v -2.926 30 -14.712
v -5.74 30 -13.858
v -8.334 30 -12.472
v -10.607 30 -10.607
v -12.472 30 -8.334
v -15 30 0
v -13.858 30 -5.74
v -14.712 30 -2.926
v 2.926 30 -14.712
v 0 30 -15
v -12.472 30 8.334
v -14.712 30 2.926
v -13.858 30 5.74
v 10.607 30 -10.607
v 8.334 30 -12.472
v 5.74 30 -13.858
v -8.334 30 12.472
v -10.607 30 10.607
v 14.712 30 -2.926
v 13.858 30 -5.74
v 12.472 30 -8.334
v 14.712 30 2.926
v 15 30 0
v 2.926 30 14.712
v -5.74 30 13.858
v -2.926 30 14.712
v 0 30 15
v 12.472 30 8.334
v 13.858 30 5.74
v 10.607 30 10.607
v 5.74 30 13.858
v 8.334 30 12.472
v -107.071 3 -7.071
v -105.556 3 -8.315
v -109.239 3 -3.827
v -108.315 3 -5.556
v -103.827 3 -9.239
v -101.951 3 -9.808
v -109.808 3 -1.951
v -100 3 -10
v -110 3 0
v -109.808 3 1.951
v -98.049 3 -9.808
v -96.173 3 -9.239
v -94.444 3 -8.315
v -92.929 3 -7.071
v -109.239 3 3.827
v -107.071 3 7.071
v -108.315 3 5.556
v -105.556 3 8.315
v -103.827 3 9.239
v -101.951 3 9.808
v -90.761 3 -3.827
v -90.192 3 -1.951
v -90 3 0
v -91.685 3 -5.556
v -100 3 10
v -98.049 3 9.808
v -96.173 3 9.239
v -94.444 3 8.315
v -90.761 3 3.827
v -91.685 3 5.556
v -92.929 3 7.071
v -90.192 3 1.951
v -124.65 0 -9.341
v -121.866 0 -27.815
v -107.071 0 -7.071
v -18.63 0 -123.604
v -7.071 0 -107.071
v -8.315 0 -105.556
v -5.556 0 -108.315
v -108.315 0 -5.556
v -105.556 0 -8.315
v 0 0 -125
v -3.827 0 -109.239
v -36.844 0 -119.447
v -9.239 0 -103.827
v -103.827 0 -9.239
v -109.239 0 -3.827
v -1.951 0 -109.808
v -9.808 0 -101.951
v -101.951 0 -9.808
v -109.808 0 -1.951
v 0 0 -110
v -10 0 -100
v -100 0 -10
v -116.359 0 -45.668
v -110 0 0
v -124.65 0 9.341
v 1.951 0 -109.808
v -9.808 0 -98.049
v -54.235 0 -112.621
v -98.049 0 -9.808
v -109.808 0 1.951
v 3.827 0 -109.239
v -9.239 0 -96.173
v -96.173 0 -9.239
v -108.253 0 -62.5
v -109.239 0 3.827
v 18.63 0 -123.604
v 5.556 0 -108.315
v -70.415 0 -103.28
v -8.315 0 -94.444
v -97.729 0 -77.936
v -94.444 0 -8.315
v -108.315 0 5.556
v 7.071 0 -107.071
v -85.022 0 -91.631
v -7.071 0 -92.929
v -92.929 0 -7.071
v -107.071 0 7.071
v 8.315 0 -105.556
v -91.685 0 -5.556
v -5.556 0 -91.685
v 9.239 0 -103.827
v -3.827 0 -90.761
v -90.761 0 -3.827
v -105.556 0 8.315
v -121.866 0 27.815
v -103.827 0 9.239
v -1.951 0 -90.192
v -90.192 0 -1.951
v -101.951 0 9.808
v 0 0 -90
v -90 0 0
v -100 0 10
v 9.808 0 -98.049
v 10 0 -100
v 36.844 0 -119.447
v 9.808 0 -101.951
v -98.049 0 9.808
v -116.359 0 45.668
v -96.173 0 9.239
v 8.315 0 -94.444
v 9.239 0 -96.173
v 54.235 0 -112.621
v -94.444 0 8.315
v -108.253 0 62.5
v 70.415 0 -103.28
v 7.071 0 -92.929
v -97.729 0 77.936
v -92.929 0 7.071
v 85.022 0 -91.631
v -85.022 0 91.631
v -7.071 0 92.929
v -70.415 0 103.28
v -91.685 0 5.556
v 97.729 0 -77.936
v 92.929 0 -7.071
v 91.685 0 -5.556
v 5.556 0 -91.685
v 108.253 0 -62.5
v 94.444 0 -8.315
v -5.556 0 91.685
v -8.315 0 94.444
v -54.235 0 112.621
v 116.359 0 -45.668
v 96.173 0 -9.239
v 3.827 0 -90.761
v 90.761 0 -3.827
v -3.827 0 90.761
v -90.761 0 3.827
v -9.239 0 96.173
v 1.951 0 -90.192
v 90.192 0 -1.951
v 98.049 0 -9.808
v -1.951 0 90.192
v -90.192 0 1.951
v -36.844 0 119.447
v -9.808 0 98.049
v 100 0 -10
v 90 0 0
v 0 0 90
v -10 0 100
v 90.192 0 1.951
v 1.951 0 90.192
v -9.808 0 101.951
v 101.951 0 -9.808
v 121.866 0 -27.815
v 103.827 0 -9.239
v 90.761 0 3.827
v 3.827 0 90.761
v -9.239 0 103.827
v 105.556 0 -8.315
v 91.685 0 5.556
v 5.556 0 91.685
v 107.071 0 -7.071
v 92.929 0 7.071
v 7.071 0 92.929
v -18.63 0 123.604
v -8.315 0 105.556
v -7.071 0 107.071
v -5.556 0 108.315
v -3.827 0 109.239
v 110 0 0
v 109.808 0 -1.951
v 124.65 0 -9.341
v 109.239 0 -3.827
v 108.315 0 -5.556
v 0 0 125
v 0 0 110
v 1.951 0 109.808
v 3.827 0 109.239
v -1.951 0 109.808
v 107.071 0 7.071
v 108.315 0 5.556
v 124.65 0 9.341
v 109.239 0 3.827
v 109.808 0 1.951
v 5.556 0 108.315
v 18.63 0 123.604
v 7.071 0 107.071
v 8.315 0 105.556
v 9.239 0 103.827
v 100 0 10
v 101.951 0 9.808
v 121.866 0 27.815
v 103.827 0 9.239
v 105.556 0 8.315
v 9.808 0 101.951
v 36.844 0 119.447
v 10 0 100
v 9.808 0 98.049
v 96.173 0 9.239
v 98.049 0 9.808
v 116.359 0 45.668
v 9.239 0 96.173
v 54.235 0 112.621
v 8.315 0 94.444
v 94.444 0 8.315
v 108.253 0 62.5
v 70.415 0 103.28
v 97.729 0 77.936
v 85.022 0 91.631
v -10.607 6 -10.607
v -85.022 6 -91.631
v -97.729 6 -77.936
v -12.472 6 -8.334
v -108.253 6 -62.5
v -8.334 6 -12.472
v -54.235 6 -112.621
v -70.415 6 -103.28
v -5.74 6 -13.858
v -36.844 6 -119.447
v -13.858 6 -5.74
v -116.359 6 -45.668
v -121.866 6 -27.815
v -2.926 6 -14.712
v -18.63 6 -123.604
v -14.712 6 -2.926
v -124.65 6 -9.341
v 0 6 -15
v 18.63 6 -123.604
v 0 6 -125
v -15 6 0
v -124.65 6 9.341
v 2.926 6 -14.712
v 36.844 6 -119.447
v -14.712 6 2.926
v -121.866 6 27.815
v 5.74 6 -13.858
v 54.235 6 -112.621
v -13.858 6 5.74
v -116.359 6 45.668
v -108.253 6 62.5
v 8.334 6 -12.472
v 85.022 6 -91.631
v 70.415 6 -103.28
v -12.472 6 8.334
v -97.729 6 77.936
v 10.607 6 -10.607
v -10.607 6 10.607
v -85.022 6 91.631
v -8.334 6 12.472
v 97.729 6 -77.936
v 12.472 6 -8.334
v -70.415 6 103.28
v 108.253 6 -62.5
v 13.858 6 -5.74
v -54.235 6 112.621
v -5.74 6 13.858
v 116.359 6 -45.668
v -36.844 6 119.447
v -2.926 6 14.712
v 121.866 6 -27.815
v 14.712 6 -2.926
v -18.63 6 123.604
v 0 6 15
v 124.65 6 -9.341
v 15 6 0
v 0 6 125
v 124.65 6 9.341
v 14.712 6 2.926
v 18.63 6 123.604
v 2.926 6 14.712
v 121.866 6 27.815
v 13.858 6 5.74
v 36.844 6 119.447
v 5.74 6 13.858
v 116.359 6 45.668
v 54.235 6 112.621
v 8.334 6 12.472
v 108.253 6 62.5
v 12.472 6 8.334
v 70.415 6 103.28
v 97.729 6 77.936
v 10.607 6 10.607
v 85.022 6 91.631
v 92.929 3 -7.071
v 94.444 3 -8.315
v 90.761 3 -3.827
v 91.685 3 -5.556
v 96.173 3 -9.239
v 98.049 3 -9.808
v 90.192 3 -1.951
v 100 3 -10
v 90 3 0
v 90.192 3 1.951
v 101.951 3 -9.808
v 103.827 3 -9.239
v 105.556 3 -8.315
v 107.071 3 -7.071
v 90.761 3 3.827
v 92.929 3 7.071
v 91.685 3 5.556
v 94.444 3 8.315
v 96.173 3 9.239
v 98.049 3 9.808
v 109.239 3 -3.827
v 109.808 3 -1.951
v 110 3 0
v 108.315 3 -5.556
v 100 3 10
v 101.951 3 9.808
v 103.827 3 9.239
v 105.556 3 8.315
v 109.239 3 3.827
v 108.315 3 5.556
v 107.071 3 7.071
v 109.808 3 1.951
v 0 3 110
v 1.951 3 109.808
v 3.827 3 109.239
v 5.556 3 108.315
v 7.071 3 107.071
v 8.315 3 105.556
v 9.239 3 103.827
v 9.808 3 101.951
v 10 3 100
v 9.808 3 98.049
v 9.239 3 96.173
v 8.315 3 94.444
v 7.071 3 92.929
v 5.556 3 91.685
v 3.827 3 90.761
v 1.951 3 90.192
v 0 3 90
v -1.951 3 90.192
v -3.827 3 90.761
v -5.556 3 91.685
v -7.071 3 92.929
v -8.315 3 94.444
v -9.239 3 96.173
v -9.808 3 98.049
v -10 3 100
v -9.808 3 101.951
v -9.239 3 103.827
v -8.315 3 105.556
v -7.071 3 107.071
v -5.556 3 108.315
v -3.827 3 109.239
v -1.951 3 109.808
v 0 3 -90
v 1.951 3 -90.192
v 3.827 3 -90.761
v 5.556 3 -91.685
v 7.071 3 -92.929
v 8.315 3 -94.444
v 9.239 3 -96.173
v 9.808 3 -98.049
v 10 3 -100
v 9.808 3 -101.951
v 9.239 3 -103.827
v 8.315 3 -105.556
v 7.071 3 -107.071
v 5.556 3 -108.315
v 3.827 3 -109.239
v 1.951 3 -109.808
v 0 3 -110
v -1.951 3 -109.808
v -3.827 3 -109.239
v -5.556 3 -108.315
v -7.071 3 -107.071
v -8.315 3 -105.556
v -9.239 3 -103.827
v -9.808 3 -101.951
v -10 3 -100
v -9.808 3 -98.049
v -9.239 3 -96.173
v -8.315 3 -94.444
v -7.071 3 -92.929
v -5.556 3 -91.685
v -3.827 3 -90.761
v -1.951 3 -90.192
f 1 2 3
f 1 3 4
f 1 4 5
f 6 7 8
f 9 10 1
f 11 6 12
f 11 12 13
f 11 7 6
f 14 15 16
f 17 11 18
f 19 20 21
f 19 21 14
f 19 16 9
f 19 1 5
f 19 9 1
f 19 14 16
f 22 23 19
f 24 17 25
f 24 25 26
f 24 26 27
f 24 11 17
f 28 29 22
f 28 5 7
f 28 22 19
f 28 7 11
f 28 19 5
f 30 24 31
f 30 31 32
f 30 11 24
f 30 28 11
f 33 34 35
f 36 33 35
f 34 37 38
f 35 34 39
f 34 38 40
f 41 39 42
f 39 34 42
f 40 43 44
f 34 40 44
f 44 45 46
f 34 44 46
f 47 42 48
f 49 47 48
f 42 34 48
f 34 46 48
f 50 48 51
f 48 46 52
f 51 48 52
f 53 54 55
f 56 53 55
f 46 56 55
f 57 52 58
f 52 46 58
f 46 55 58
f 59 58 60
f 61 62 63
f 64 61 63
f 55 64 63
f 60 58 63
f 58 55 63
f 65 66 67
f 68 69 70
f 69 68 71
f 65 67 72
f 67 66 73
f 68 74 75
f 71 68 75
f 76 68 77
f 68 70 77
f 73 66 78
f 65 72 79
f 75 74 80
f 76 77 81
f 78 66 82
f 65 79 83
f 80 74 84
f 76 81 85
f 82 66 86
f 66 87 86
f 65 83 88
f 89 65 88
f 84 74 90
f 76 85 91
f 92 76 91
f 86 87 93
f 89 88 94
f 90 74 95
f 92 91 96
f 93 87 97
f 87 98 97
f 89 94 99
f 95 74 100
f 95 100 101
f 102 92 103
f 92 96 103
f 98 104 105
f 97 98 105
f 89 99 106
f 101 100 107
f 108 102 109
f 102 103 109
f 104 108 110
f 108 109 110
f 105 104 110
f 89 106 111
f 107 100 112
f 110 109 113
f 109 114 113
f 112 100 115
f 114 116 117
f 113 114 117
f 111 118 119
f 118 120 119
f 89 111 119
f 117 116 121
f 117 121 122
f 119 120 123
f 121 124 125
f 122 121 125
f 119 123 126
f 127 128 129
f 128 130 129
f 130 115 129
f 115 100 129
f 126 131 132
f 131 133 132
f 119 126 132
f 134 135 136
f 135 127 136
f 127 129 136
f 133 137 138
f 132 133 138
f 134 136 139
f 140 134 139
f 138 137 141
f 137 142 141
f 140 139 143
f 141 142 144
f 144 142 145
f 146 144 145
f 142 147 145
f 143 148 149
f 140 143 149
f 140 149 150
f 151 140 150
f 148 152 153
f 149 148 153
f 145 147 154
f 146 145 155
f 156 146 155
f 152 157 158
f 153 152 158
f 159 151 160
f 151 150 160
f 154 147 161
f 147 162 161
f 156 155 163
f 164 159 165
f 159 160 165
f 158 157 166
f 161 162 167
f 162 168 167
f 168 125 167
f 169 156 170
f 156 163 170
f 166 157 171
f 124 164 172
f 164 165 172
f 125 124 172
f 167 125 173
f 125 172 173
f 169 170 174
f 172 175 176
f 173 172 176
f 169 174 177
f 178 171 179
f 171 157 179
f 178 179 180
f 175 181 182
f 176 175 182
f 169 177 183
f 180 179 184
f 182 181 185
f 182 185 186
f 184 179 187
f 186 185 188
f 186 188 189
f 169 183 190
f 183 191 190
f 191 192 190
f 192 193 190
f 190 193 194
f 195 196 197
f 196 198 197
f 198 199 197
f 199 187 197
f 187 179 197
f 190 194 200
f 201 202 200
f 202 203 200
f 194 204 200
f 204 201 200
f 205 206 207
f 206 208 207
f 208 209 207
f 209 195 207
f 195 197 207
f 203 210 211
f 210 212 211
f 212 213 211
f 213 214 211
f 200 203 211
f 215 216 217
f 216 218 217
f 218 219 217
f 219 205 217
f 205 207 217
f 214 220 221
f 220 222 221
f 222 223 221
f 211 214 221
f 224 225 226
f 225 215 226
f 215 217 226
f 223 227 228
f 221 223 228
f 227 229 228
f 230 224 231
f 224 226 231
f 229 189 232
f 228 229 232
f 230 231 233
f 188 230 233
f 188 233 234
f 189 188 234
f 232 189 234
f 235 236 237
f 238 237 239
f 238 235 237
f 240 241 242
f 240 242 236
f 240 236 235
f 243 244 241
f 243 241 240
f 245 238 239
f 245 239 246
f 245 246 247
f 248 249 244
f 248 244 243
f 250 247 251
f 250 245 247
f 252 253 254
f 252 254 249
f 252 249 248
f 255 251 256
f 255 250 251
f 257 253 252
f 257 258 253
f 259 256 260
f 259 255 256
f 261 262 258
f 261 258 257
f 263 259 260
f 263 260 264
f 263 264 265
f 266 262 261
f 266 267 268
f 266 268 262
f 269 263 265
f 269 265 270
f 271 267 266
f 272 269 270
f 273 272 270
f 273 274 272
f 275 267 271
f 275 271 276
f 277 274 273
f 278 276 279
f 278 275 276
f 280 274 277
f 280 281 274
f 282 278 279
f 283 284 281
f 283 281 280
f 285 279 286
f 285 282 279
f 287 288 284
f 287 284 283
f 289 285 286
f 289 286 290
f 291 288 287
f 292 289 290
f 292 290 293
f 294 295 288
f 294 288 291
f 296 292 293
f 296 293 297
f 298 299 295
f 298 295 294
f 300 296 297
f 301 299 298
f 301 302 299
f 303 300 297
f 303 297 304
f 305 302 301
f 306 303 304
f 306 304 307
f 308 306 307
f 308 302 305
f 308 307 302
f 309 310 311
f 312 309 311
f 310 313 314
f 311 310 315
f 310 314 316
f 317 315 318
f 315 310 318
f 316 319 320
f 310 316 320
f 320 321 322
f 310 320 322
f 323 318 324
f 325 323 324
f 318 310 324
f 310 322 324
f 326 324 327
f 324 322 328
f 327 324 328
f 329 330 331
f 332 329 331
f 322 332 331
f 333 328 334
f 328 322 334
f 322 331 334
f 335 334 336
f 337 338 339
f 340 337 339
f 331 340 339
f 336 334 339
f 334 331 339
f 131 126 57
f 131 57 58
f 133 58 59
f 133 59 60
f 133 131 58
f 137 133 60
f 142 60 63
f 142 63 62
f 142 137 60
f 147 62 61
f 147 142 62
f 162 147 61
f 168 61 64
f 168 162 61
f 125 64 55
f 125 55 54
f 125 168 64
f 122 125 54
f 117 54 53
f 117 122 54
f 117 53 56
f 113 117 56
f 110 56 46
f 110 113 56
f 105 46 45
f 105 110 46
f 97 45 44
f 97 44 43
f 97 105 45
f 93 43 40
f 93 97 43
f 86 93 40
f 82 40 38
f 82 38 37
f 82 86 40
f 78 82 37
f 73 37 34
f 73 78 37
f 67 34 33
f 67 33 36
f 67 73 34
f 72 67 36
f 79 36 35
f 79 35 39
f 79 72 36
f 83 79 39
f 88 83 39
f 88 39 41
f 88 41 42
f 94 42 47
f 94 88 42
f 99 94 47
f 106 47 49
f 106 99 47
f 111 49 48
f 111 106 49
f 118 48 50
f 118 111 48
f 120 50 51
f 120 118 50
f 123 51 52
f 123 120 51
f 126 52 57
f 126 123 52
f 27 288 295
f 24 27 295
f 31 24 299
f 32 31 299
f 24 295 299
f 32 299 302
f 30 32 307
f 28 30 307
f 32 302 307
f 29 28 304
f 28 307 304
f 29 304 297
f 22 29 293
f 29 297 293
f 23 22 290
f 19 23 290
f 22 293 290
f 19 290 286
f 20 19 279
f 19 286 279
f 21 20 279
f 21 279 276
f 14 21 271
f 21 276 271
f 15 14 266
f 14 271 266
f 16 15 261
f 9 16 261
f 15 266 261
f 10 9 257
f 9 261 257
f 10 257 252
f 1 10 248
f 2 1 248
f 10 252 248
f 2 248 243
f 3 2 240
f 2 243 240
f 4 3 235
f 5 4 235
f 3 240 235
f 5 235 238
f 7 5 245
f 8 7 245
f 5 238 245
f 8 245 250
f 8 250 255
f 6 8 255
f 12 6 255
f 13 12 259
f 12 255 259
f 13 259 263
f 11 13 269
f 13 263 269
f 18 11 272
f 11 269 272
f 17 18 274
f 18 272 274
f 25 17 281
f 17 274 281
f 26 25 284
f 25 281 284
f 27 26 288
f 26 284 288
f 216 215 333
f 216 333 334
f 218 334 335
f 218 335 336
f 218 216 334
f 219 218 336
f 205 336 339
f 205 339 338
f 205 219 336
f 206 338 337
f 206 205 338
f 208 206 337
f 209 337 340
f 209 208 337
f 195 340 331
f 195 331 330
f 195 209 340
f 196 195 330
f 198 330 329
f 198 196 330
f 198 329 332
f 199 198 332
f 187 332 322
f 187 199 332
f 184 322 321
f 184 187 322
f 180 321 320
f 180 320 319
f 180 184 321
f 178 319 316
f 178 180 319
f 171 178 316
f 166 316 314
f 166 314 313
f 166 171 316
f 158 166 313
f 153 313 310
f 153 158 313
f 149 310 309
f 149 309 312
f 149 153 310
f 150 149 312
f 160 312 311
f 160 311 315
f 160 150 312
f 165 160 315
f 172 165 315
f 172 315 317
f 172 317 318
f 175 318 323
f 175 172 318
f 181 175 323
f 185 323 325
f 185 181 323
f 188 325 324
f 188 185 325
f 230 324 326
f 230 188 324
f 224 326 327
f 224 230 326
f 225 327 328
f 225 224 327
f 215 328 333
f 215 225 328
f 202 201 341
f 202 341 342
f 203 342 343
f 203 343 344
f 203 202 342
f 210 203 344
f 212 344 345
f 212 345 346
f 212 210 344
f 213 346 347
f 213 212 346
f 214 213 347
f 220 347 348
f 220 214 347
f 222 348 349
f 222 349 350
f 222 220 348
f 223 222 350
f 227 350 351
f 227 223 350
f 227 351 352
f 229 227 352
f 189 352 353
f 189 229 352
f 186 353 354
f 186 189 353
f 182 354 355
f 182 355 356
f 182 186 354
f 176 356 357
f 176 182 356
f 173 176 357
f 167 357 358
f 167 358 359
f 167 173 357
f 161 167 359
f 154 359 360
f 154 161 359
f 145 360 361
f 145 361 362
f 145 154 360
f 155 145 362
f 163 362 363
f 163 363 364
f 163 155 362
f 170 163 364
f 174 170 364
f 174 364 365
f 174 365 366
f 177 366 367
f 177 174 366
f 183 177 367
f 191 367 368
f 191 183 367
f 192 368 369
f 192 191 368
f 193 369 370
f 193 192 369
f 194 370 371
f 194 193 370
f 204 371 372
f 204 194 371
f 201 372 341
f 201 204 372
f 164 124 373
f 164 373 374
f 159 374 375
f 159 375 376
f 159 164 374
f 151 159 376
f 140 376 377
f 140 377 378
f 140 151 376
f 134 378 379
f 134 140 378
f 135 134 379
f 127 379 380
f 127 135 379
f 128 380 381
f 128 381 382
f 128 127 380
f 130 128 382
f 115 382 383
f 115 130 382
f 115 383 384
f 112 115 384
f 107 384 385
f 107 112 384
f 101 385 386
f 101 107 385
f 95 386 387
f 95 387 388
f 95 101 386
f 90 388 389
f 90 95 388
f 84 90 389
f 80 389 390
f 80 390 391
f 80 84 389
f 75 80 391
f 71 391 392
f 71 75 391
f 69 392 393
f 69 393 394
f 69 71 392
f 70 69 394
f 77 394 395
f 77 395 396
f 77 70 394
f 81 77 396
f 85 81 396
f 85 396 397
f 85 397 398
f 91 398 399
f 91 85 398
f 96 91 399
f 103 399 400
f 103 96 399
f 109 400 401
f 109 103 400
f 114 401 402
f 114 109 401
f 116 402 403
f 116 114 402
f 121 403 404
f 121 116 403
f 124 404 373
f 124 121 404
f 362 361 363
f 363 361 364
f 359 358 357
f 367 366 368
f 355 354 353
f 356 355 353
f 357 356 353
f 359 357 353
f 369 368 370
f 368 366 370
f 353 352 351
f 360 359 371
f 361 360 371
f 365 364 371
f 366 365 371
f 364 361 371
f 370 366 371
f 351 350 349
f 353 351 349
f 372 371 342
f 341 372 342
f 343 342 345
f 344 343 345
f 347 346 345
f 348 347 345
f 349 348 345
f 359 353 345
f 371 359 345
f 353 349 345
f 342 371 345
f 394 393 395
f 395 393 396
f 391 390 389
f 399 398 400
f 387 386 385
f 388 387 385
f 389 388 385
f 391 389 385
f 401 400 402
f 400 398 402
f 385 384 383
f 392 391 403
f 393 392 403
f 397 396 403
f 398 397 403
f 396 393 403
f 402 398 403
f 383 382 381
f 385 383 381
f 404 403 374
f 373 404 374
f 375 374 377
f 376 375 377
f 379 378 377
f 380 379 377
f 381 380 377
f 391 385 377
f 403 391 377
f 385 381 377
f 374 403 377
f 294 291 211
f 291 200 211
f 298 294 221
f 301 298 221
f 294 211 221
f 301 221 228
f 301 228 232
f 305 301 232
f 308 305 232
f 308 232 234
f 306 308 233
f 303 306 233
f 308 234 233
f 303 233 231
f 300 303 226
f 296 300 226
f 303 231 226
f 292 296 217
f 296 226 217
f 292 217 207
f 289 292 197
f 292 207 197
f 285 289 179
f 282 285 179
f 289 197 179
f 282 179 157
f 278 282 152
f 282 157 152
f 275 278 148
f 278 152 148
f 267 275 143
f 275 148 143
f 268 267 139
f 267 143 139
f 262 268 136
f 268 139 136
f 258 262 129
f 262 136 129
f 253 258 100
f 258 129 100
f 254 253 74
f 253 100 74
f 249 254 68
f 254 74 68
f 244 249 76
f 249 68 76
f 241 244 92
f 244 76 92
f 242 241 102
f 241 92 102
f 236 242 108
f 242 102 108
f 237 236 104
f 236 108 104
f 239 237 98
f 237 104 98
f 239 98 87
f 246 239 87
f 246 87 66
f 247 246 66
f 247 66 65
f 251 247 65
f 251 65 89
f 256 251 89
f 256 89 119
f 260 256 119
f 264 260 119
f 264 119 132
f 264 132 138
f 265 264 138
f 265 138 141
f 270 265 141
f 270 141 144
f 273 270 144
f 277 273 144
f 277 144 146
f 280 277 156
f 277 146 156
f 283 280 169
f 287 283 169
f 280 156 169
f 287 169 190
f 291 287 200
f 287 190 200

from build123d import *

# Parameters (mm, degrees)
SKETCH1_R                               = 125
SKETCH1_R_2                             = 10
BOSS_EXTRUDE1_DEPTH                     = 3
SKETCH2_R                               = 125
B_T_CH_N_DRONE_DEPTH                    = 3
SKETCH3_R                               = 15
TR_C_G_N_V_O_V_NG_BI_THAY_I_MATCH_DEPTH = 24


with BuildPart() as part:
    # Sketch1 → Boss-Extrude1 (new body)
    with BuildSketch(Plane(origin=(0, 0, 0), x_dir=(1, 0, 0), z_dir=(0, 1, 0))):
        with Locations(Location((0, 0, 0), (0, 0, 270))):
            Circle(SKETCH1_R)
        with Locations(Location((0, 100, 0), (0, 0, 270))):
            Circle(SKETCH1_R_2, mode=Mode.SUBTRACT)
        with Locations(Location((100, 0, 0), (0, 0, 270))):
            Circle(SKETCH1_R_2, mode=Mode.SUBTRACT)
        with Locations(Location((0, -100, 0), (0, 0, 270))):
            Circle(SKETCH1_R_2, mode=Mode.SUBTRACT)
        with Locations(Location((-100, 0, 0), (0, 0, 270))):
            Circle(SKETCH1_R_2, mode=Mode.SUBTRACT)
    extrude(amount=BOSS_EXTRUDE1_DEPTH)

    # Sketch2 → bắt chân drone (add)
    with BuildSketch(Plane(origin=(0, 3, 0), x_dir=(1, 0, 0), z_dir=(0, 1, 0))):
        with Locations(Location((0, 0, 0), (0, 0, 270))):
            Circle(SKETCH2_R)
    extrude(amount=B_T_CH_N_DRONE_DEPTH)

    # Sketch3 → Trục gắn vào vòng bi (Thay đổi để match) (add)
    with BuildSketch(Plane(origin=(0, 6, 0), x_dir=(1, 0, 0), z_dir=(0, 1, 0))):
        with Locations(Location((0, 0, 0), (0, 0, 270))):
            Circle(SKETCH3_R)
    extrude(amount=TR_C_G_N_V_O_V_NG_BI_THAY_I_MATCH_DEPTH)


solid = part.part
